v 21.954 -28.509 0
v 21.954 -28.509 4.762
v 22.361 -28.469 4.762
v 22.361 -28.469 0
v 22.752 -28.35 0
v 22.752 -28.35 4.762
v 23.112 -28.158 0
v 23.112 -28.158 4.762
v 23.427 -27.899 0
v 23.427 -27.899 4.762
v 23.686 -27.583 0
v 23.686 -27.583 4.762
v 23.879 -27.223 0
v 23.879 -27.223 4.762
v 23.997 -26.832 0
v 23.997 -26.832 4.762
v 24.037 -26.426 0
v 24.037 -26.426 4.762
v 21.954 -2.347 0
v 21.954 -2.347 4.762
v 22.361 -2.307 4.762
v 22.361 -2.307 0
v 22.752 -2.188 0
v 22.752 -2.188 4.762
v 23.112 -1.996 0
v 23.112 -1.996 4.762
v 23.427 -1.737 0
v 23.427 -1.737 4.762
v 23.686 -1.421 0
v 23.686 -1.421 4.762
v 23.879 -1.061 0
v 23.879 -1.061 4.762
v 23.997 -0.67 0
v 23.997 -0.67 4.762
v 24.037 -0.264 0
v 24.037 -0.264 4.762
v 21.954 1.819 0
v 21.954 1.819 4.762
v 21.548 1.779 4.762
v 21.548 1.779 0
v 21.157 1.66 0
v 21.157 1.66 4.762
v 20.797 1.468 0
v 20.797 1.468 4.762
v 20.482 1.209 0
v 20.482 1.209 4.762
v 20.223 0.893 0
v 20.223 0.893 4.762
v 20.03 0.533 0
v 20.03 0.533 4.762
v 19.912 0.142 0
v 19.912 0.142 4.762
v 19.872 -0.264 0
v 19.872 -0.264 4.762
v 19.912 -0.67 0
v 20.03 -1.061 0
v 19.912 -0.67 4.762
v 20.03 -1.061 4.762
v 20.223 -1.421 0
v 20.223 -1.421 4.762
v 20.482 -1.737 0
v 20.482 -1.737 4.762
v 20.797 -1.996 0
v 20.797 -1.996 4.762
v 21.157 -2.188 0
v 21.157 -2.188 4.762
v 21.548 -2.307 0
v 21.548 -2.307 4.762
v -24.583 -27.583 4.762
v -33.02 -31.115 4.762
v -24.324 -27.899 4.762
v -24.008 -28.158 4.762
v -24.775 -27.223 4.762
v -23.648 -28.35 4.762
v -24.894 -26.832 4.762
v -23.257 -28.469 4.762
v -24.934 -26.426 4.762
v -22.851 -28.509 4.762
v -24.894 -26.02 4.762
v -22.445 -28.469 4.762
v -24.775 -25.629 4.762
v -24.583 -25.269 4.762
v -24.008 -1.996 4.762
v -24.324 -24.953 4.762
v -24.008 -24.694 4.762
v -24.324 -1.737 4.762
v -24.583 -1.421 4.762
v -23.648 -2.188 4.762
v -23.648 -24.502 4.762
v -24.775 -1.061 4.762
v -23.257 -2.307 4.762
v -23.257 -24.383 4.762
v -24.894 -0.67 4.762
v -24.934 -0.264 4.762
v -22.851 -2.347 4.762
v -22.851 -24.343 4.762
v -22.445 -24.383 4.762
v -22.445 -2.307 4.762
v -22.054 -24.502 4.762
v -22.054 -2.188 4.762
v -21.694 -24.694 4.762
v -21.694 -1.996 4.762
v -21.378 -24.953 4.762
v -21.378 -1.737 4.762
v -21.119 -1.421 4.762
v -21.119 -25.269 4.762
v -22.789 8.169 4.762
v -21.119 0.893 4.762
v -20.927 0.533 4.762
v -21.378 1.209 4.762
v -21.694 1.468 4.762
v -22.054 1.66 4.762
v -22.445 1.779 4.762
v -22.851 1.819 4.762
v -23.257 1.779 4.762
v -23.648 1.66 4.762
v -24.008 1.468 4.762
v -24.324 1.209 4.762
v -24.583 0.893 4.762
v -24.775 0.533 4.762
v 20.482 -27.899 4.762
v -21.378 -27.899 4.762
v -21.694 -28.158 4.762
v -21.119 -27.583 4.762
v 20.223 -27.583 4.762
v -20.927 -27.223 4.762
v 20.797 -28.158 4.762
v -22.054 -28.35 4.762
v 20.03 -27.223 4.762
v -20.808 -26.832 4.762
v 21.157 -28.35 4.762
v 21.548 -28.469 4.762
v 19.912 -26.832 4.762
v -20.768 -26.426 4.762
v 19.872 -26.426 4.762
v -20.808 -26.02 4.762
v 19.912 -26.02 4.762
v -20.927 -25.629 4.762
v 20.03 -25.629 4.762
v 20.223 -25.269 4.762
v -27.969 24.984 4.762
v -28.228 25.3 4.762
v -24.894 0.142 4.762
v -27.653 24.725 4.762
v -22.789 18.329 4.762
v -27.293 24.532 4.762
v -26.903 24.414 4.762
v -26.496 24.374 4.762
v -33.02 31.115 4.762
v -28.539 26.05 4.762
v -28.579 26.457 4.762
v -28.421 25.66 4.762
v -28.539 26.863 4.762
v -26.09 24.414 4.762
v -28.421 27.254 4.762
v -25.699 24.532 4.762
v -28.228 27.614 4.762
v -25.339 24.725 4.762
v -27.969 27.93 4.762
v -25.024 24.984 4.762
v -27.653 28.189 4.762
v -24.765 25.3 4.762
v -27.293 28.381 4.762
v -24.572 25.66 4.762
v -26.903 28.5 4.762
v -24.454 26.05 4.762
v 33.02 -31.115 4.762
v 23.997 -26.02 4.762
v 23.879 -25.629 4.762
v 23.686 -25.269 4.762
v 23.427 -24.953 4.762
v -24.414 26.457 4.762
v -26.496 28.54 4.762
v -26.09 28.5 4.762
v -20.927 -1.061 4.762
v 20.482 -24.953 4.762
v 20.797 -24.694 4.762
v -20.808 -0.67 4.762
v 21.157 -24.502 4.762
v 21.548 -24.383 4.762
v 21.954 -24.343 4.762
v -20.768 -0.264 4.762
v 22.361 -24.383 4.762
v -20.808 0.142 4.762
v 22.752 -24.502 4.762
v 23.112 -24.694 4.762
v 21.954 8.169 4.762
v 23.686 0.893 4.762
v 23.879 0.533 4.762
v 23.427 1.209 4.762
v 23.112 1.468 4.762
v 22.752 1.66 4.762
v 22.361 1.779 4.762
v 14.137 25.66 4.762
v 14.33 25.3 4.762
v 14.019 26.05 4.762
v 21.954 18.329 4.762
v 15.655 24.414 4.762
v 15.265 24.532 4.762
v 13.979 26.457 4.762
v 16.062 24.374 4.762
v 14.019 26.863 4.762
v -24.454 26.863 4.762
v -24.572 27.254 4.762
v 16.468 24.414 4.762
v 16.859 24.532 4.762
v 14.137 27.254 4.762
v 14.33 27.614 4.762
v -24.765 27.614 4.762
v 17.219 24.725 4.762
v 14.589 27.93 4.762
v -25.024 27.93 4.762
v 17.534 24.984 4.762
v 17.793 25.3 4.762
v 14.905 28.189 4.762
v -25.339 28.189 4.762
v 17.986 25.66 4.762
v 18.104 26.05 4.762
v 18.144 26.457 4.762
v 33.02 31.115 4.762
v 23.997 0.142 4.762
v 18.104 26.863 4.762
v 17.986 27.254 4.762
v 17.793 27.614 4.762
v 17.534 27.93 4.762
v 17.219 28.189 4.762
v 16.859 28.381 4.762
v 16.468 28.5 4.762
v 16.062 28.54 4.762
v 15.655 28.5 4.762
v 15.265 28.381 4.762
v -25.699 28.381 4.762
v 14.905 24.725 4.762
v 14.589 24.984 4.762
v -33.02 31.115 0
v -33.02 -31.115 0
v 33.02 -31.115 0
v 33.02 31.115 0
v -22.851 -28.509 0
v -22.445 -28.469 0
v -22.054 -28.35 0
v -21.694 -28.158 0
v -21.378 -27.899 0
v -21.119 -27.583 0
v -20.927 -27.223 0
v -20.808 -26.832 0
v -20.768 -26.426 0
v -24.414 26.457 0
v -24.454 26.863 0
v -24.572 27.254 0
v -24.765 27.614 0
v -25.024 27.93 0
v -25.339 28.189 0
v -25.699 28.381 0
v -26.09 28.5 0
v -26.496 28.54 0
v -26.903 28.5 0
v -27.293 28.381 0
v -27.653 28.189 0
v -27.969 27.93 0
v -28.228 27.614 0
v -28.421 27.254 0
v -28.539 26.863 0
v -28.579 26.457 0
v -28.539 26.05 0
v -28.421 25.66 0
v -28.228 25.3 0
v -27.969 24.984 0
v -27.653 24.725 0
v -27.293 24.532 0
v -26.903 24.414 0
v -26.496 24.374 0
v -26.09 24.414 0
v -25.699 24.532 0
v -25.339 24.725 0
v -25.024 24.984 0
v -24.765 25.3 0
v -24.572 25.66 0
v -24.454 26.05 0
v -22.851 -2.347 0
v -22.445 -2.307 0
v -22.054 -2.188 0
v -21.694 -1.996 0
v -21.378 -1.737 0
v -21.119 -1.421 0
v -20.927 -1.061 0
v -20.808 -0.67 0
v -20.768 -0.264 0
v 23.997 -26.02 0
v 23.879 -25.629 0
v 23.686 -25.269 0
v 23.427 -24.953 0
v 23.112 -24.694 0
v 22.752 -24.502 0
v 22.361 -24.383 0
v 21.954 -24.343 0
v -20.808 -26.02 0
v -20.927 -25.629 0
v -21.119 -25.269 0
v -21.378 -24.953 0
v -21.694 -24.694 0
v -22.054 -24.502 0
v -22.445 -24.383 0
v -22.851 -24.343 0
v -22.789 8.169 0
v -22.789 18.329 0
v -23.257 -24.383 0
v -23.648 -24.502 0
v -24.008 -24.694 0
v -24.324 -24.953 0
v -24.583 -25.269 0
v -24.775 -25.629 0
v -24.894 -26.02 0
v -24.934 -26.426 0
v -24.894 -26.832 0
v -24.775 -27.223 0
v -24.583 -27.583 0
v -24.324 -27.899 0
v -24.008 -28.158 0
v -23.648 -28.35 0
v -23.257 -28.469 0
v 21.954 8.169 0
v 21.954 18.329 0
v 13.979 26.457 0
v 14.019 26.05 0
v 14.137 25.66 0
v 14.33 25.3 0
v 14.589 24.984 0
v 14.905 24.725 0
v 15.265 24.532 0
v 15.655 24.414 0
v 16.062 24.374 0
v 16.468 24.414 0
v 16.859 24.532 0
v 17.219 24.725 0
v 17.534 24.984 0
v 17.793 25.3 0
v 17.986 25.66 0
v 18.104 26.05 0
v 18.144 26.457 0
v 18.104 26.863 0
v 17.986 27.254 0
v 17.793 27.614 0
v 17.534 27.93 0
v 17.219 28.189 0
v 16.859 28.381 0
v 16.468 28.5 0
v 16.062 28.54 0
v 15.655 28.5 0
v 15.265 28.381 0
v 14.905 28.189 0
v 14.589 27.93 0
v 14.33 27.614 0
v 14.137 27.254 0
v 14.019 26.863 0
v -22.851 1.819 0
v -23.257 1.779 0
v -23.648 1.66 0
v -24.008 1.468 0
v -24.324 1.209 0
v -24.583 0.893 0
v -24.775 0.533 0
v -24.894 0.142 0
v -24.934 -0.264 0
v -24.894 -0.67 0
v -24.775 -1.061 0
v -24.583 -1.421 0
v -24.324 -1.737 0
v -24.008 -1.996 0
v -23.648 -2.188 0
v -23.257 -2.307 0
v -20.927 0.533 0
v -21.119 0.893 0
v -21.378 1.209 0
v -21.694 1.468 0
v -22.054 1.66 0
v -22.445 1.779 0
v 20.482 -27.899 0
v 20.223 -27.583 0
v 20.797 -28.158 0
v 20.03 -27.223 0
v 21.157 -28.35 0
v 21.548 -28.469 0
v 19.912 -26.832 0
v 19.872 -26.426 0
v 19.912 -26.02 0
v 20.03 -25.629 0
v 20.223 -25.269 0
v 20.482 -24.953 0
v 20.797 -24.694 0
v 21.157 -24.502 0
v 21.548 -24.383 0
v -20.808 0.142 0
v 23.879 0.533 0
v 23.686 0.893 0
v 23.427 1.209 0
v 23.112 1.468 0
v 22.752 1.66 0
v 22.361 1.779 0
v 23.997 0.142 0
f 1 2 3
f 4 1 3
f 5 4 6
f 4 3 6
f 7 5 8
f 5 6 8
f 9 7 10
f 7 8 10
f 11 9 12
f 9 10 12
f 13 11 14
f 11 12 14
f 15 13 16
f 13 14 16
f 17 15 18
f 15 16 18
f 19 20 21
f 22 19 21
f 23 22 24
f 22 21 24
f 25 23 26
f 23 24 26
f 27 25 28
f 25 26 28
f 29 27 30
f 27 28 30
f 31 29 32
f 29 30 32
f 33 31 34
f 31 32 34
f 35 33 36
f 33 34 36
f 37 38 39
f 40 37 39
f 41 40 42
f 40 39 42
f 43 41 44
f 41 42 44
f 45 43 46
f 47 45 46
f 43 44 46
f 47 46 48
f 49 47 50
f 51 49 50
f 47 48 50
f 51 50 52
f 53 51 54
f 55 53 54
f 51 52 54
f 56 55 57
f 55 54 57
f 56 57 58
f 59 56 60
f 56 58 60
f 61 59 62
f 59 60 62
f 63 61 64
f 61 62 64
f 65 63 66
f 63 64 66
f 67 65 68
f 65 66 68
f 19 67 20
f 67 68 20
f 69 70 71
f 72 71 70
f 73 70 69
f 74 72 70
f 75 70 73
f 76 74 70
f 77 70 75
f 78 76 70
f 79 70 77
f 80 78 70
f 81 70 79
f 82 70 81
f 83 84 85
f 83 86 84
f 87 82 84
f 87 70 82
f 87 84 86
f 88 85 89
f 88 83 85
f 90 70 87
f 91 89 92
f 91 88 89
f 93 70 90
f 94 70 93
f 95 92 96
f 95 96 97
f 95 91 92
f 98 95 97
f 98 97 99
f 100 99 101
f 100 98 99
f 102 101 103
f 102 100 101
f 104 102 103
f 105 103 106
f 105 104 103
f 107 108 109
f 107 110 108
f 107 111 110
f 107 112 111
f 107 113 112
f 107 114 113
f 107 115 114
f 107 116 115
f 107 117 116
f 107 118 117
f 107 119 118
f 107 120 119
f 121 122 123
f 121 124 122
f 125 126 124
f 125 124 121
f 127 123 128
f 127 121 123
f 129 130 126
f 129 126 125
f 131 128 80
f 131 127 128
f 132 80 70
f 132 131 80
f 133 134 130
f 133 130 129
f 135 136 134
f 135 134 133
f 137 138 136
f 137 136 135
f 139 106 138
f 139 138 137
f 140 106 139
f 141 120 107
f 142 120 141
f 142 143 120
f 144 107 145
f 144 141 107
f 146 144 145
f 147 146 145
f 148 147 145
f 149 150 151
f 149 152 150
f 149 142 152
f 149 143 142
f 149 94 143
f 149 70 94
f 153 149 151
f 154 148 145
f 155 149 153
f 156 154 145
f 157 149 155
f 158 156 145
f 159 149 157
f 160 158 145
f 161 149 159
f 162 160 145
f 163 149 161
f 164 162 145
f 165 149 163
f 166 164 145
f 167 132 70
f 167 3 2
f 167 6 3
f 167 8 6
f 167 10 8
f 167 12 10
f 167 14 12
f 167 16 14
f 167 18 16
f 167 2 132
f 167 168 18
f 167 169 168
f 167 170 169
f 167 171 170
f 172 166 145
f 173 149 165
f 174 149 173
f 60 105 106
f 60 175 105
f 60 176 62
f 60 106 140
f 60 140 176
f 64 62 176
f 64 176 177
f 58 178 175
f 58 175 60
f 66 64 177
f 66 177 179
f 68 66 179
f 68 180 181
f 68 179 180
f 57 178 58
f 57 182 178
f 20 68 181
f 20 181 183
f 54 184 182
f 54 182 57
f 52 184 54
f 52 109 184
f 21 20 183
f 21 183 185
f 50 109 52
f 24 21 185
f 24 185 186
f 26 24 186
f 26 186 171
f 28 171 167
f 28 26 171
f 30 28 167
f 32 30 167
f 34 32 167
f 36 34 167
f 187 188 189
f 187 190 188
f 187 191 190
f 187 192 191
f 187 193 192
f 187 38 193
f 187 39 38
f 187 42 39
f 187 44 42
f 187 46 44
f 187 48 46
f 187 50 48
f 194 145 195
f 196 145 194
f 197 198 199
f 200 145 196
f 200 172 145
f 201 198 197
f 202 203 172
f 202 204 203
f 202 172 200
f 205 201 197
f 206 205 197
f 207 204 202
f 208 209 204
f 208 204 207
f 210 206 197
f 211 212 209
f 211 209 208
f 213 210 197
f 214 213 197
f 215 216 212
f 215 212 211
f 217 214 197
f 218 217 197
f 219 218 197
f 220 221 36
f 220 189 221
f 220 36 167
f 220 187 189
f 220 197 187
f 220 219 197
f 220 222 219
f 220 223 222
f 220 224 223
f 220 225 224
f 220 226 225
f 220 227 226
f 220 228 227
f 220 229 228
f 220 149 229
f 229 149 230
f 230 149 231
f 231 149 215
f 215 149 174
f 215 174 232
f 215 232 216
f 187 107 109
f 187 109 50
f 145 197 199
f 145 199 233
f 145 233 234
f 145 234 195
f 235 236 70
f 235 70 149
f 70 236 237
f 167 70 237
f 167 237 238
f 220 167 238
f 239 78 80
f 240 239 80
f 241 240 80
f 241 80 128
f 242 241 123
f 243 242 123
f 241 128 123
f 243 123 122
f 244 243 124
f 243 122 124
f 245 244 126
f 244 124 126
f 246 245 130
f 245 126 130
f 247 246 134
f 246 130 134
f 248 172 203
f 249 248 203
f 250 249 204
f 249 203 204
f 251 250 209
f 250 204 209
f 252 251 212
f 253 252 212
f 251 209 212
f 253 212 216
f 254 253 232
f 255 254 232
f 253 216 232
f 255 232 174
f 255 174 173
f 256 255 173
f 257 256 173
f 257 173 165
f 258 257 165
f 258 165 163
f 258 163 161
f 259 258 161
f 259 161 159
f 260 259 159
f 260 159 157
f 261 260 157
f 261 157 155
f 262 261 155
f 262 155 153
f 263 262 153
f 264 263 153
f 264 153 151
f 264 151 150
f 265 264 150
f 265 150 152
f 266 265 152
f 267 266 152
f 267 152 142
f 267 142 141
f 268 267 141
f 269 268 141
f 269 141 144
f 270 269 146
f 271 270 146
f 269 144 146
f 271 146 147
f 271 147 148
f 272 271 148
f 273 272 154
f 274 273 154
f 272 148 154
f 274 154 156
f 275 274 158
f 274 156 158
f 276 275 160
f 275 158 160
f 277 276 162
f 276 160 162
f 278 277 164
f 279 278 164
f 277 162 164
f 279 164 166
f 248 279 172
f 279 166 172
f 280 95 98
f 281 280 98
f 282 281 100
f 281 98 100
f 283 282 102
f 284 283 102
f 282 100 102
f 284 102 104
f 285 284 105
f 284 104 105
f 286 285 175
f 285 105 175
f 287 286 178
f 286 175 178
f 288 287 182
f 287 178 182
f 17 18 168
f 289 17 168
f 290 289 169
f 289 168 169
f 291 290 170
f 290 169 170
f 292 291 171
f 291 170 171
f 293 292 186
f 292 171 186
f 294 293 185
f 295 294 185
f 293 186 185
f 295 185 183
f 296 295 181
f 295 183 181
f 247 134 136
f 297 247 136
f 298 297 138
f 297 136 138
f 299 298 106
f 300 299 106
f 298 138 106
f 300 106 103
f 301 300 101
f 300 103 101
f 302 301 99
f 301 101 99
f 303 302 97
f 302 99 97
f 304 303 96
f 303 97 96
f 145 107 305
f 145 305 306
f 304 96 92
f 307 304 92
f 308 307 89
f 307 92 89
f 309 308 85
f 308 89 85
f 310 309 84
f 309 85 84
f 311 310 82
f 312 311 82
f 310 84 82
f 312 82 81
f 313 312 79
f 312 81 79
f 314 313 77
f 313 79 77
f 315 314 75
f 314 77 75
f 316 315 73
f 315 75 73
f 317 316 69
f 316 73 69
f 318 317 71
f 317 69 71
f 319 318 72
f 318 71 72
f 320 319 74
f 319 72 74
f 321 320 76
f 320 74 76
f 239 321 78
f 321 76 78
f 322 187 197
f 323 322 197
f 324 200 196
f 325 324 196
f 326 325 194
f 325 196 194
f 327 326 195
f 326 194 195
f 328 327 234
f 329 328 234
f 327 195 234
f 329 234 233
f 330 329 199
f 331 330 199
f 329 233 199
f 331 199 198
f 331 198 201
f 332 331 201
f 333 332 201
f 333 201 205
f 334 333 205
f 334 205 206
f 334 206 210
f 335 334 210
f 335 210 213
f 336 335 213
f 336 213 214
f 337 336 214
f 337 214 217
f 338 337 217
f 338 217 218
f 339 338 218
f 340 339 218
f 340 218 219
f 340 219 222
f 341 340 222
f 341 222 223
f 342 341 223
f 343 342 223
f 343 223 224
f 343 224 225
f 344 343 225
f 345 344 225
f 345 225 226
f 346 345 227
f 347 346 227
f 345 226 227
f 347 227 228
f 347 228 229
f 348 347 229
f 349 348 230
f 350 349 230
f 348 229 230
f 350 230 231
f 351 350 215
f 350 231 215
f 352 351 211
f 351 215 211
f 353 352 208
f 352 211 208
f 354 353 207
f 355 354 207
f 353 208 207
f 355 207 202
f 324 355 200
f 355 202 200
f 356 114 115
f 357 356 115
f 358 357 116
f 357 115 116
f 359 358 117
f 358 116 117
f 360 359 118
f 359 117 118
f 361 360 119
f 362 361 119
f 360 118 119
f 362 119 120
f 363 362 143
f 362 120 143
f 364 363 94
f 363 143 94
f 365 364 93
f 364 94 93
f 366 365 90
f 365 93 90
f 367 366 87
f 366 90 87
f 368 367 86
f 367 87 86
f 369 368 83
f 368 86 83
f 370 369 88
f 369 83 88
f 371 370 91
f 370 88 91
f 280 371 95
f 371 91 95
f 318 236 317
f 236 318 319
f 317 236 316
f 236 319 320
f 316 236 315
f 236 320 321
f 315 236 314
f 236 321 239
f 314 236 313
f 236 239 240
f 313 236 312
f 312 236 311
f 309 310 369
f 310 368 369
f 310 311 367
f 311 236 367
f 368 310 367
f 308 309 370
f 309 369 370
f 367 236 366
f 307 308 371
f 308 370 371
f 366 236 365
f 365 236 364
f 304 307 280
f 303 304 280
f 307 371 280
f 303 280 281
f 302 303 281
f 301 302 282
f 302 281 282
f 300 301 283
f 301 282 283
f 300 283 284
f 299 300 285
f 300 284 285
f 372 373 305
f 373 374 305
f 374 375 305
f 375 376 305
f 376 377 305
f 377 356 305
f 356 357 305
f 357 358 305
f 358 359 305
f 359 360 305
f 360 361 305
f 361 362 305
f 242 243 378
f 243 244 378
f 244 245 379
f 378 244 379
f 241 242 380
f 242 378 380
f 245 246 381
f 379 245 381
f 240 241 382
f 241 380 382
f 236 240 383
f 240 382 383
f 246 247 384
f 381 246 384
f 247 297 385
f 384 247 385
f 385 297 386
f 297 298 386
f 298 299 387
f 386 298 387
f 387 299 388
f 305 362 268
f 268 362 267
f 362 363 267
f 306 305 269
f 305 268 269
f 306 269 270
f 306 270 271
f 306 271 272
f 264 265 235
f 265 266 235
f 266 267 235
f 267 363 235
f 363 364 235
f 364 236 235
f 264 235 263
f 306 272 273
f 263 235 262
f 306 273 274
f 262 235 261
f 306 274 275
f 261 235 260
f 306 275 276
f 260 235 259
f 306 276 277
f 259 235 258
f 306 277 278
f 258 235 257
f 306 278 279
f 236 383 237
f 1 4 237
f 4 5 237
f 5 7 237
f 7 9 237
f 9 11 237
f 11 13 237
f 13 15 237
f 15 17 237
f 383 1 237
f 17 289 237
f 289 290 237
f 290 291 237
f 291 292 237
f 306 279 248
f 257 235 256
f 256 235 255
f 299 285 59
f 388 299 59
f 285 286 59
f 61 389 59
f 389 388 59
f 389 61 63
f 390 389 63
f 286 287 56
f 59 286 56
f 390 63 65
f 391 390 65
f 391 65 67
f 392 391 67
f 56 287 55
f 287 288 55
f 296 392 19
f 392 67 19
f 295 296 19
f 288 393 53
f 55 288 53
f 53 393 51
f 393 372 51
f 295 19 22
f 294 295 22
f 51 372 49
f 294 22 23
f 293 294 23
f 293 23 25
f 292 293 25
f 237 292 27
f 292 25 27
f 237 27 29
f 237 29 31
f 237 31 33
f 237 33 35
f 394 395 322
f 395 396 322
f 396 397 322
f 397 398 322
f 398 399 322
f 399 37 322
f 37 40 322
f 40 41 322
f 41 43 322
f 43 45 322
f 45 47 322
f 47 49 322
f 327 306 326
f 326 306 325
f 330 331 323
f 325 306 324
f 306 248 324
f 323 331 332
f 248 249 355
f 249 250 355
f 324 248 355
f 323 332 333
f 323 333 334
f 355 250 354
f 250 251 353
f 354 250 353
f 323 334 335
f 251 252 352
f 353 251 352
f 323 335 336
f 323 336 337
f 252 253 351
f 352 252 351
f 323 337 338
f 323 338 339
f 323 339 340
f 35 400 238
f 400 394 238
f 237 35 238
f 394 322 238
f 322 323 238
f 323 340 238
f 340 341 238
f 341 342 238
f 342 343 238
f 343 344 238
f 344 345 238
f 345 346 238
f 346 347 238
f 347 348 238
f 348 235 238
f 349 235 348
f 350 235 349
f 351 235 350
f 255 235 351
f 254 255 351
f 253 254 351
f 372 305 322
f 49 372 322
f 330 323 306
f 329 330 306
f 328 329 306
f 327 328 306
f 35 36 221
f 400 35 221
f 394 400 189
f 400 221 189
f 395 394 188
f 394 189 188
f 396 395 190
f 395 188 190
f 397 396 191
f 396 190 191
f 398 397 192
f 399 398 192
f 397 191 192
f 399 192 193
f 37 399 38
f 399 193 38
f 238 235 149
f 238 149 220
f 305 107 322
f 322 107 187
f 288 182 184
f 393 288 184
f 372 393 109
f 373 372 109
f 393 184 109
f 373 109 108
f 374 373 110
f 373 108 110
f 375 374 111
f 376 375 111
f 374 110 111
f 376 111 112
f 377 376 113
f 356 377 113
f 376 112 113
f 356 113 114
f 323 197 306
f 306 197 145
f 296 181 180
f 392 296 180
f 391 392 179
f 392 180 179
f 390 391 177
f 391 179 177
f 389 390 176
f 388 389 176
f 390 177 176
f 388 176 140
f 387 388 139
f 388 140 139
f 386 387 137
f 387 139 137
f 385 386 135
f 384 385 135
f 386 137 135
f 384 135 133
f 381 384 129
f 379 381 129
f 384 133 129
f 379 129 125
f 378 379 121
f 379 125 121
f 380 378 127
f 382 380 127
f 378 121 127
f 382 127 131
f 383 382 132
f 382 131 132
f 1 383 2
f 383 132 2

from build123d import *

# Parameters (mm, degrees)
F0_W     = 66.04
F0_H     = 62.23
F1_DEPTH = 4.7625
F2_R     = 2.0828
F2_W     = 23.6109700747
F2_H     = 10.16
F2_W_2   = 21.1328
F3_DEPTH = 25.4


with BuildPart() as f1:
    # F0 (on Top) → F1 (new body)
    with BuildSketch(Plane.XY):
        Rectangle(F0_W, F0_H)
    extrude(amount=F1_DEPTH)

    # F2 (on face) → F3 (cut)
    with BuildSketch(Plane.XY.offset(4.7625)):
        with Locations((-26.4963417654, 26.4567458333)):
            Circle(F2_R)
        with BuildLine():
            ThreePointArc((18.1444912354, 26.4567458333), (16.0616912354, 28.5395458333), (13.9788912354, 26.4567458333))
            ThreePointArc((13.9788912354, 26.4567458333), (16.0616912354, 24.3739458333), (18.1444912354, 26.4567458333))
        make_face()
        with BuildLine():
            ThreePointArc((24.0372912354, -0.2640541667), (23.4272532393, 1.2087078372), (21.9544912354, 1.8187458333))
            Line((21.9544912354, 1.8187458333), (21.9544912354, -2.3468541667))
            ThreePointArc((21.9544912354, -2.3468541667), (23.4272532393, -1.7368161705), (24.0372912354, -0.2640541667))
        make_face()
        with BuildLine():
            Line((21.9544912354, -2.3468541667), (21.9544912354, 1.8187458333))
            ThreePointArc((21.9544912354, 1.8187458333), (19.8716912354, -0.2640541667), (21.9544912354, -2.3468541667))
        make_face()
        with BuildLine():
            ThreePointArc((-20.7683087646, -0.2640541667), (-21.3783467607, 1.2087078372), (-22.8511087646, 1.8187458333))
            Line((-22.8511087646, 1.8187458333), (-22.8511087646, -2.3468541667))
            ThreePointArc((-22.8511087646, -2.3468541667), (-21.3783467607, -1.7368161705), (-20.7683087646, -0.2640541667))
        make_face()
        with BuildLine():
            Line((-22.8511087646, -2.3468541667), (-22.8511087646, 1.8187458333))
            ThreePointArc((-22.8511087646, 1.8187458333), (-24.9339087646, -0.2640541667), (-22.8511087646, -2.3468541667))
        make_face()
        with BuildLine():
            Line((-22.8511087646, -24.3432541667), (-22.8511087646, -28.5088541667))
            ThreePointArc((-22.8511087646, -28.5088541667), (-21.3783467607, -27.8988161705), (-20.7683087646, -26.4260541667))
            ThreePointArc((-20.7683087646, -26.4260541667), (-21.3783467607, -24.9532921628), (-22.8511087646, -24.3432541667))
        make_face()
        with BuildLine():
            ThreePointArc((-22.8511087646, -24.3432541667), (-24.9339087646, -26.4260541667), (-22.8511087646, -28.5088541667))
            Line((-22.8511087646, -28.5088541667), (-22.8511087646, -24.3432541667))
        make_face()
        with BuildLine():
            Line((21.9544912354, -24.3432541667), (21.9544912354, -28.5088541667))
            ThreePointArc((21.9544912354, -28.5088541667), (23.4272532393, -27.8988161705), (24.0372912354, -26.4260541667))
            ThreePointArc((24.0372912354, -26.4260541667), (23.4272532393, -24.9532921628), (21.9544912354, -24.3432541667))
        make_face()
        with BuildLine():
            ThreePointArc((21.9544912354, -24.3432541667), (19.8716912354, -26.4260541667), (21.9544912354, -28.5088541667))
            Line((21.9544912354, -28.5088541667), (21.9544912354, -24.3432541667))
        make_face()
        with Locations((-10.9837938019, 13.2487458333)):
            Rectangle(F2_W, F2_H)
        with Locations((11.3880912354, 13.2487458333)):
            Rectangle(F2_W_2, F2_H)
    extrude(amount=-F3_DEPTH, mode=Mode.SUBTRACT)


solid = f1.part
